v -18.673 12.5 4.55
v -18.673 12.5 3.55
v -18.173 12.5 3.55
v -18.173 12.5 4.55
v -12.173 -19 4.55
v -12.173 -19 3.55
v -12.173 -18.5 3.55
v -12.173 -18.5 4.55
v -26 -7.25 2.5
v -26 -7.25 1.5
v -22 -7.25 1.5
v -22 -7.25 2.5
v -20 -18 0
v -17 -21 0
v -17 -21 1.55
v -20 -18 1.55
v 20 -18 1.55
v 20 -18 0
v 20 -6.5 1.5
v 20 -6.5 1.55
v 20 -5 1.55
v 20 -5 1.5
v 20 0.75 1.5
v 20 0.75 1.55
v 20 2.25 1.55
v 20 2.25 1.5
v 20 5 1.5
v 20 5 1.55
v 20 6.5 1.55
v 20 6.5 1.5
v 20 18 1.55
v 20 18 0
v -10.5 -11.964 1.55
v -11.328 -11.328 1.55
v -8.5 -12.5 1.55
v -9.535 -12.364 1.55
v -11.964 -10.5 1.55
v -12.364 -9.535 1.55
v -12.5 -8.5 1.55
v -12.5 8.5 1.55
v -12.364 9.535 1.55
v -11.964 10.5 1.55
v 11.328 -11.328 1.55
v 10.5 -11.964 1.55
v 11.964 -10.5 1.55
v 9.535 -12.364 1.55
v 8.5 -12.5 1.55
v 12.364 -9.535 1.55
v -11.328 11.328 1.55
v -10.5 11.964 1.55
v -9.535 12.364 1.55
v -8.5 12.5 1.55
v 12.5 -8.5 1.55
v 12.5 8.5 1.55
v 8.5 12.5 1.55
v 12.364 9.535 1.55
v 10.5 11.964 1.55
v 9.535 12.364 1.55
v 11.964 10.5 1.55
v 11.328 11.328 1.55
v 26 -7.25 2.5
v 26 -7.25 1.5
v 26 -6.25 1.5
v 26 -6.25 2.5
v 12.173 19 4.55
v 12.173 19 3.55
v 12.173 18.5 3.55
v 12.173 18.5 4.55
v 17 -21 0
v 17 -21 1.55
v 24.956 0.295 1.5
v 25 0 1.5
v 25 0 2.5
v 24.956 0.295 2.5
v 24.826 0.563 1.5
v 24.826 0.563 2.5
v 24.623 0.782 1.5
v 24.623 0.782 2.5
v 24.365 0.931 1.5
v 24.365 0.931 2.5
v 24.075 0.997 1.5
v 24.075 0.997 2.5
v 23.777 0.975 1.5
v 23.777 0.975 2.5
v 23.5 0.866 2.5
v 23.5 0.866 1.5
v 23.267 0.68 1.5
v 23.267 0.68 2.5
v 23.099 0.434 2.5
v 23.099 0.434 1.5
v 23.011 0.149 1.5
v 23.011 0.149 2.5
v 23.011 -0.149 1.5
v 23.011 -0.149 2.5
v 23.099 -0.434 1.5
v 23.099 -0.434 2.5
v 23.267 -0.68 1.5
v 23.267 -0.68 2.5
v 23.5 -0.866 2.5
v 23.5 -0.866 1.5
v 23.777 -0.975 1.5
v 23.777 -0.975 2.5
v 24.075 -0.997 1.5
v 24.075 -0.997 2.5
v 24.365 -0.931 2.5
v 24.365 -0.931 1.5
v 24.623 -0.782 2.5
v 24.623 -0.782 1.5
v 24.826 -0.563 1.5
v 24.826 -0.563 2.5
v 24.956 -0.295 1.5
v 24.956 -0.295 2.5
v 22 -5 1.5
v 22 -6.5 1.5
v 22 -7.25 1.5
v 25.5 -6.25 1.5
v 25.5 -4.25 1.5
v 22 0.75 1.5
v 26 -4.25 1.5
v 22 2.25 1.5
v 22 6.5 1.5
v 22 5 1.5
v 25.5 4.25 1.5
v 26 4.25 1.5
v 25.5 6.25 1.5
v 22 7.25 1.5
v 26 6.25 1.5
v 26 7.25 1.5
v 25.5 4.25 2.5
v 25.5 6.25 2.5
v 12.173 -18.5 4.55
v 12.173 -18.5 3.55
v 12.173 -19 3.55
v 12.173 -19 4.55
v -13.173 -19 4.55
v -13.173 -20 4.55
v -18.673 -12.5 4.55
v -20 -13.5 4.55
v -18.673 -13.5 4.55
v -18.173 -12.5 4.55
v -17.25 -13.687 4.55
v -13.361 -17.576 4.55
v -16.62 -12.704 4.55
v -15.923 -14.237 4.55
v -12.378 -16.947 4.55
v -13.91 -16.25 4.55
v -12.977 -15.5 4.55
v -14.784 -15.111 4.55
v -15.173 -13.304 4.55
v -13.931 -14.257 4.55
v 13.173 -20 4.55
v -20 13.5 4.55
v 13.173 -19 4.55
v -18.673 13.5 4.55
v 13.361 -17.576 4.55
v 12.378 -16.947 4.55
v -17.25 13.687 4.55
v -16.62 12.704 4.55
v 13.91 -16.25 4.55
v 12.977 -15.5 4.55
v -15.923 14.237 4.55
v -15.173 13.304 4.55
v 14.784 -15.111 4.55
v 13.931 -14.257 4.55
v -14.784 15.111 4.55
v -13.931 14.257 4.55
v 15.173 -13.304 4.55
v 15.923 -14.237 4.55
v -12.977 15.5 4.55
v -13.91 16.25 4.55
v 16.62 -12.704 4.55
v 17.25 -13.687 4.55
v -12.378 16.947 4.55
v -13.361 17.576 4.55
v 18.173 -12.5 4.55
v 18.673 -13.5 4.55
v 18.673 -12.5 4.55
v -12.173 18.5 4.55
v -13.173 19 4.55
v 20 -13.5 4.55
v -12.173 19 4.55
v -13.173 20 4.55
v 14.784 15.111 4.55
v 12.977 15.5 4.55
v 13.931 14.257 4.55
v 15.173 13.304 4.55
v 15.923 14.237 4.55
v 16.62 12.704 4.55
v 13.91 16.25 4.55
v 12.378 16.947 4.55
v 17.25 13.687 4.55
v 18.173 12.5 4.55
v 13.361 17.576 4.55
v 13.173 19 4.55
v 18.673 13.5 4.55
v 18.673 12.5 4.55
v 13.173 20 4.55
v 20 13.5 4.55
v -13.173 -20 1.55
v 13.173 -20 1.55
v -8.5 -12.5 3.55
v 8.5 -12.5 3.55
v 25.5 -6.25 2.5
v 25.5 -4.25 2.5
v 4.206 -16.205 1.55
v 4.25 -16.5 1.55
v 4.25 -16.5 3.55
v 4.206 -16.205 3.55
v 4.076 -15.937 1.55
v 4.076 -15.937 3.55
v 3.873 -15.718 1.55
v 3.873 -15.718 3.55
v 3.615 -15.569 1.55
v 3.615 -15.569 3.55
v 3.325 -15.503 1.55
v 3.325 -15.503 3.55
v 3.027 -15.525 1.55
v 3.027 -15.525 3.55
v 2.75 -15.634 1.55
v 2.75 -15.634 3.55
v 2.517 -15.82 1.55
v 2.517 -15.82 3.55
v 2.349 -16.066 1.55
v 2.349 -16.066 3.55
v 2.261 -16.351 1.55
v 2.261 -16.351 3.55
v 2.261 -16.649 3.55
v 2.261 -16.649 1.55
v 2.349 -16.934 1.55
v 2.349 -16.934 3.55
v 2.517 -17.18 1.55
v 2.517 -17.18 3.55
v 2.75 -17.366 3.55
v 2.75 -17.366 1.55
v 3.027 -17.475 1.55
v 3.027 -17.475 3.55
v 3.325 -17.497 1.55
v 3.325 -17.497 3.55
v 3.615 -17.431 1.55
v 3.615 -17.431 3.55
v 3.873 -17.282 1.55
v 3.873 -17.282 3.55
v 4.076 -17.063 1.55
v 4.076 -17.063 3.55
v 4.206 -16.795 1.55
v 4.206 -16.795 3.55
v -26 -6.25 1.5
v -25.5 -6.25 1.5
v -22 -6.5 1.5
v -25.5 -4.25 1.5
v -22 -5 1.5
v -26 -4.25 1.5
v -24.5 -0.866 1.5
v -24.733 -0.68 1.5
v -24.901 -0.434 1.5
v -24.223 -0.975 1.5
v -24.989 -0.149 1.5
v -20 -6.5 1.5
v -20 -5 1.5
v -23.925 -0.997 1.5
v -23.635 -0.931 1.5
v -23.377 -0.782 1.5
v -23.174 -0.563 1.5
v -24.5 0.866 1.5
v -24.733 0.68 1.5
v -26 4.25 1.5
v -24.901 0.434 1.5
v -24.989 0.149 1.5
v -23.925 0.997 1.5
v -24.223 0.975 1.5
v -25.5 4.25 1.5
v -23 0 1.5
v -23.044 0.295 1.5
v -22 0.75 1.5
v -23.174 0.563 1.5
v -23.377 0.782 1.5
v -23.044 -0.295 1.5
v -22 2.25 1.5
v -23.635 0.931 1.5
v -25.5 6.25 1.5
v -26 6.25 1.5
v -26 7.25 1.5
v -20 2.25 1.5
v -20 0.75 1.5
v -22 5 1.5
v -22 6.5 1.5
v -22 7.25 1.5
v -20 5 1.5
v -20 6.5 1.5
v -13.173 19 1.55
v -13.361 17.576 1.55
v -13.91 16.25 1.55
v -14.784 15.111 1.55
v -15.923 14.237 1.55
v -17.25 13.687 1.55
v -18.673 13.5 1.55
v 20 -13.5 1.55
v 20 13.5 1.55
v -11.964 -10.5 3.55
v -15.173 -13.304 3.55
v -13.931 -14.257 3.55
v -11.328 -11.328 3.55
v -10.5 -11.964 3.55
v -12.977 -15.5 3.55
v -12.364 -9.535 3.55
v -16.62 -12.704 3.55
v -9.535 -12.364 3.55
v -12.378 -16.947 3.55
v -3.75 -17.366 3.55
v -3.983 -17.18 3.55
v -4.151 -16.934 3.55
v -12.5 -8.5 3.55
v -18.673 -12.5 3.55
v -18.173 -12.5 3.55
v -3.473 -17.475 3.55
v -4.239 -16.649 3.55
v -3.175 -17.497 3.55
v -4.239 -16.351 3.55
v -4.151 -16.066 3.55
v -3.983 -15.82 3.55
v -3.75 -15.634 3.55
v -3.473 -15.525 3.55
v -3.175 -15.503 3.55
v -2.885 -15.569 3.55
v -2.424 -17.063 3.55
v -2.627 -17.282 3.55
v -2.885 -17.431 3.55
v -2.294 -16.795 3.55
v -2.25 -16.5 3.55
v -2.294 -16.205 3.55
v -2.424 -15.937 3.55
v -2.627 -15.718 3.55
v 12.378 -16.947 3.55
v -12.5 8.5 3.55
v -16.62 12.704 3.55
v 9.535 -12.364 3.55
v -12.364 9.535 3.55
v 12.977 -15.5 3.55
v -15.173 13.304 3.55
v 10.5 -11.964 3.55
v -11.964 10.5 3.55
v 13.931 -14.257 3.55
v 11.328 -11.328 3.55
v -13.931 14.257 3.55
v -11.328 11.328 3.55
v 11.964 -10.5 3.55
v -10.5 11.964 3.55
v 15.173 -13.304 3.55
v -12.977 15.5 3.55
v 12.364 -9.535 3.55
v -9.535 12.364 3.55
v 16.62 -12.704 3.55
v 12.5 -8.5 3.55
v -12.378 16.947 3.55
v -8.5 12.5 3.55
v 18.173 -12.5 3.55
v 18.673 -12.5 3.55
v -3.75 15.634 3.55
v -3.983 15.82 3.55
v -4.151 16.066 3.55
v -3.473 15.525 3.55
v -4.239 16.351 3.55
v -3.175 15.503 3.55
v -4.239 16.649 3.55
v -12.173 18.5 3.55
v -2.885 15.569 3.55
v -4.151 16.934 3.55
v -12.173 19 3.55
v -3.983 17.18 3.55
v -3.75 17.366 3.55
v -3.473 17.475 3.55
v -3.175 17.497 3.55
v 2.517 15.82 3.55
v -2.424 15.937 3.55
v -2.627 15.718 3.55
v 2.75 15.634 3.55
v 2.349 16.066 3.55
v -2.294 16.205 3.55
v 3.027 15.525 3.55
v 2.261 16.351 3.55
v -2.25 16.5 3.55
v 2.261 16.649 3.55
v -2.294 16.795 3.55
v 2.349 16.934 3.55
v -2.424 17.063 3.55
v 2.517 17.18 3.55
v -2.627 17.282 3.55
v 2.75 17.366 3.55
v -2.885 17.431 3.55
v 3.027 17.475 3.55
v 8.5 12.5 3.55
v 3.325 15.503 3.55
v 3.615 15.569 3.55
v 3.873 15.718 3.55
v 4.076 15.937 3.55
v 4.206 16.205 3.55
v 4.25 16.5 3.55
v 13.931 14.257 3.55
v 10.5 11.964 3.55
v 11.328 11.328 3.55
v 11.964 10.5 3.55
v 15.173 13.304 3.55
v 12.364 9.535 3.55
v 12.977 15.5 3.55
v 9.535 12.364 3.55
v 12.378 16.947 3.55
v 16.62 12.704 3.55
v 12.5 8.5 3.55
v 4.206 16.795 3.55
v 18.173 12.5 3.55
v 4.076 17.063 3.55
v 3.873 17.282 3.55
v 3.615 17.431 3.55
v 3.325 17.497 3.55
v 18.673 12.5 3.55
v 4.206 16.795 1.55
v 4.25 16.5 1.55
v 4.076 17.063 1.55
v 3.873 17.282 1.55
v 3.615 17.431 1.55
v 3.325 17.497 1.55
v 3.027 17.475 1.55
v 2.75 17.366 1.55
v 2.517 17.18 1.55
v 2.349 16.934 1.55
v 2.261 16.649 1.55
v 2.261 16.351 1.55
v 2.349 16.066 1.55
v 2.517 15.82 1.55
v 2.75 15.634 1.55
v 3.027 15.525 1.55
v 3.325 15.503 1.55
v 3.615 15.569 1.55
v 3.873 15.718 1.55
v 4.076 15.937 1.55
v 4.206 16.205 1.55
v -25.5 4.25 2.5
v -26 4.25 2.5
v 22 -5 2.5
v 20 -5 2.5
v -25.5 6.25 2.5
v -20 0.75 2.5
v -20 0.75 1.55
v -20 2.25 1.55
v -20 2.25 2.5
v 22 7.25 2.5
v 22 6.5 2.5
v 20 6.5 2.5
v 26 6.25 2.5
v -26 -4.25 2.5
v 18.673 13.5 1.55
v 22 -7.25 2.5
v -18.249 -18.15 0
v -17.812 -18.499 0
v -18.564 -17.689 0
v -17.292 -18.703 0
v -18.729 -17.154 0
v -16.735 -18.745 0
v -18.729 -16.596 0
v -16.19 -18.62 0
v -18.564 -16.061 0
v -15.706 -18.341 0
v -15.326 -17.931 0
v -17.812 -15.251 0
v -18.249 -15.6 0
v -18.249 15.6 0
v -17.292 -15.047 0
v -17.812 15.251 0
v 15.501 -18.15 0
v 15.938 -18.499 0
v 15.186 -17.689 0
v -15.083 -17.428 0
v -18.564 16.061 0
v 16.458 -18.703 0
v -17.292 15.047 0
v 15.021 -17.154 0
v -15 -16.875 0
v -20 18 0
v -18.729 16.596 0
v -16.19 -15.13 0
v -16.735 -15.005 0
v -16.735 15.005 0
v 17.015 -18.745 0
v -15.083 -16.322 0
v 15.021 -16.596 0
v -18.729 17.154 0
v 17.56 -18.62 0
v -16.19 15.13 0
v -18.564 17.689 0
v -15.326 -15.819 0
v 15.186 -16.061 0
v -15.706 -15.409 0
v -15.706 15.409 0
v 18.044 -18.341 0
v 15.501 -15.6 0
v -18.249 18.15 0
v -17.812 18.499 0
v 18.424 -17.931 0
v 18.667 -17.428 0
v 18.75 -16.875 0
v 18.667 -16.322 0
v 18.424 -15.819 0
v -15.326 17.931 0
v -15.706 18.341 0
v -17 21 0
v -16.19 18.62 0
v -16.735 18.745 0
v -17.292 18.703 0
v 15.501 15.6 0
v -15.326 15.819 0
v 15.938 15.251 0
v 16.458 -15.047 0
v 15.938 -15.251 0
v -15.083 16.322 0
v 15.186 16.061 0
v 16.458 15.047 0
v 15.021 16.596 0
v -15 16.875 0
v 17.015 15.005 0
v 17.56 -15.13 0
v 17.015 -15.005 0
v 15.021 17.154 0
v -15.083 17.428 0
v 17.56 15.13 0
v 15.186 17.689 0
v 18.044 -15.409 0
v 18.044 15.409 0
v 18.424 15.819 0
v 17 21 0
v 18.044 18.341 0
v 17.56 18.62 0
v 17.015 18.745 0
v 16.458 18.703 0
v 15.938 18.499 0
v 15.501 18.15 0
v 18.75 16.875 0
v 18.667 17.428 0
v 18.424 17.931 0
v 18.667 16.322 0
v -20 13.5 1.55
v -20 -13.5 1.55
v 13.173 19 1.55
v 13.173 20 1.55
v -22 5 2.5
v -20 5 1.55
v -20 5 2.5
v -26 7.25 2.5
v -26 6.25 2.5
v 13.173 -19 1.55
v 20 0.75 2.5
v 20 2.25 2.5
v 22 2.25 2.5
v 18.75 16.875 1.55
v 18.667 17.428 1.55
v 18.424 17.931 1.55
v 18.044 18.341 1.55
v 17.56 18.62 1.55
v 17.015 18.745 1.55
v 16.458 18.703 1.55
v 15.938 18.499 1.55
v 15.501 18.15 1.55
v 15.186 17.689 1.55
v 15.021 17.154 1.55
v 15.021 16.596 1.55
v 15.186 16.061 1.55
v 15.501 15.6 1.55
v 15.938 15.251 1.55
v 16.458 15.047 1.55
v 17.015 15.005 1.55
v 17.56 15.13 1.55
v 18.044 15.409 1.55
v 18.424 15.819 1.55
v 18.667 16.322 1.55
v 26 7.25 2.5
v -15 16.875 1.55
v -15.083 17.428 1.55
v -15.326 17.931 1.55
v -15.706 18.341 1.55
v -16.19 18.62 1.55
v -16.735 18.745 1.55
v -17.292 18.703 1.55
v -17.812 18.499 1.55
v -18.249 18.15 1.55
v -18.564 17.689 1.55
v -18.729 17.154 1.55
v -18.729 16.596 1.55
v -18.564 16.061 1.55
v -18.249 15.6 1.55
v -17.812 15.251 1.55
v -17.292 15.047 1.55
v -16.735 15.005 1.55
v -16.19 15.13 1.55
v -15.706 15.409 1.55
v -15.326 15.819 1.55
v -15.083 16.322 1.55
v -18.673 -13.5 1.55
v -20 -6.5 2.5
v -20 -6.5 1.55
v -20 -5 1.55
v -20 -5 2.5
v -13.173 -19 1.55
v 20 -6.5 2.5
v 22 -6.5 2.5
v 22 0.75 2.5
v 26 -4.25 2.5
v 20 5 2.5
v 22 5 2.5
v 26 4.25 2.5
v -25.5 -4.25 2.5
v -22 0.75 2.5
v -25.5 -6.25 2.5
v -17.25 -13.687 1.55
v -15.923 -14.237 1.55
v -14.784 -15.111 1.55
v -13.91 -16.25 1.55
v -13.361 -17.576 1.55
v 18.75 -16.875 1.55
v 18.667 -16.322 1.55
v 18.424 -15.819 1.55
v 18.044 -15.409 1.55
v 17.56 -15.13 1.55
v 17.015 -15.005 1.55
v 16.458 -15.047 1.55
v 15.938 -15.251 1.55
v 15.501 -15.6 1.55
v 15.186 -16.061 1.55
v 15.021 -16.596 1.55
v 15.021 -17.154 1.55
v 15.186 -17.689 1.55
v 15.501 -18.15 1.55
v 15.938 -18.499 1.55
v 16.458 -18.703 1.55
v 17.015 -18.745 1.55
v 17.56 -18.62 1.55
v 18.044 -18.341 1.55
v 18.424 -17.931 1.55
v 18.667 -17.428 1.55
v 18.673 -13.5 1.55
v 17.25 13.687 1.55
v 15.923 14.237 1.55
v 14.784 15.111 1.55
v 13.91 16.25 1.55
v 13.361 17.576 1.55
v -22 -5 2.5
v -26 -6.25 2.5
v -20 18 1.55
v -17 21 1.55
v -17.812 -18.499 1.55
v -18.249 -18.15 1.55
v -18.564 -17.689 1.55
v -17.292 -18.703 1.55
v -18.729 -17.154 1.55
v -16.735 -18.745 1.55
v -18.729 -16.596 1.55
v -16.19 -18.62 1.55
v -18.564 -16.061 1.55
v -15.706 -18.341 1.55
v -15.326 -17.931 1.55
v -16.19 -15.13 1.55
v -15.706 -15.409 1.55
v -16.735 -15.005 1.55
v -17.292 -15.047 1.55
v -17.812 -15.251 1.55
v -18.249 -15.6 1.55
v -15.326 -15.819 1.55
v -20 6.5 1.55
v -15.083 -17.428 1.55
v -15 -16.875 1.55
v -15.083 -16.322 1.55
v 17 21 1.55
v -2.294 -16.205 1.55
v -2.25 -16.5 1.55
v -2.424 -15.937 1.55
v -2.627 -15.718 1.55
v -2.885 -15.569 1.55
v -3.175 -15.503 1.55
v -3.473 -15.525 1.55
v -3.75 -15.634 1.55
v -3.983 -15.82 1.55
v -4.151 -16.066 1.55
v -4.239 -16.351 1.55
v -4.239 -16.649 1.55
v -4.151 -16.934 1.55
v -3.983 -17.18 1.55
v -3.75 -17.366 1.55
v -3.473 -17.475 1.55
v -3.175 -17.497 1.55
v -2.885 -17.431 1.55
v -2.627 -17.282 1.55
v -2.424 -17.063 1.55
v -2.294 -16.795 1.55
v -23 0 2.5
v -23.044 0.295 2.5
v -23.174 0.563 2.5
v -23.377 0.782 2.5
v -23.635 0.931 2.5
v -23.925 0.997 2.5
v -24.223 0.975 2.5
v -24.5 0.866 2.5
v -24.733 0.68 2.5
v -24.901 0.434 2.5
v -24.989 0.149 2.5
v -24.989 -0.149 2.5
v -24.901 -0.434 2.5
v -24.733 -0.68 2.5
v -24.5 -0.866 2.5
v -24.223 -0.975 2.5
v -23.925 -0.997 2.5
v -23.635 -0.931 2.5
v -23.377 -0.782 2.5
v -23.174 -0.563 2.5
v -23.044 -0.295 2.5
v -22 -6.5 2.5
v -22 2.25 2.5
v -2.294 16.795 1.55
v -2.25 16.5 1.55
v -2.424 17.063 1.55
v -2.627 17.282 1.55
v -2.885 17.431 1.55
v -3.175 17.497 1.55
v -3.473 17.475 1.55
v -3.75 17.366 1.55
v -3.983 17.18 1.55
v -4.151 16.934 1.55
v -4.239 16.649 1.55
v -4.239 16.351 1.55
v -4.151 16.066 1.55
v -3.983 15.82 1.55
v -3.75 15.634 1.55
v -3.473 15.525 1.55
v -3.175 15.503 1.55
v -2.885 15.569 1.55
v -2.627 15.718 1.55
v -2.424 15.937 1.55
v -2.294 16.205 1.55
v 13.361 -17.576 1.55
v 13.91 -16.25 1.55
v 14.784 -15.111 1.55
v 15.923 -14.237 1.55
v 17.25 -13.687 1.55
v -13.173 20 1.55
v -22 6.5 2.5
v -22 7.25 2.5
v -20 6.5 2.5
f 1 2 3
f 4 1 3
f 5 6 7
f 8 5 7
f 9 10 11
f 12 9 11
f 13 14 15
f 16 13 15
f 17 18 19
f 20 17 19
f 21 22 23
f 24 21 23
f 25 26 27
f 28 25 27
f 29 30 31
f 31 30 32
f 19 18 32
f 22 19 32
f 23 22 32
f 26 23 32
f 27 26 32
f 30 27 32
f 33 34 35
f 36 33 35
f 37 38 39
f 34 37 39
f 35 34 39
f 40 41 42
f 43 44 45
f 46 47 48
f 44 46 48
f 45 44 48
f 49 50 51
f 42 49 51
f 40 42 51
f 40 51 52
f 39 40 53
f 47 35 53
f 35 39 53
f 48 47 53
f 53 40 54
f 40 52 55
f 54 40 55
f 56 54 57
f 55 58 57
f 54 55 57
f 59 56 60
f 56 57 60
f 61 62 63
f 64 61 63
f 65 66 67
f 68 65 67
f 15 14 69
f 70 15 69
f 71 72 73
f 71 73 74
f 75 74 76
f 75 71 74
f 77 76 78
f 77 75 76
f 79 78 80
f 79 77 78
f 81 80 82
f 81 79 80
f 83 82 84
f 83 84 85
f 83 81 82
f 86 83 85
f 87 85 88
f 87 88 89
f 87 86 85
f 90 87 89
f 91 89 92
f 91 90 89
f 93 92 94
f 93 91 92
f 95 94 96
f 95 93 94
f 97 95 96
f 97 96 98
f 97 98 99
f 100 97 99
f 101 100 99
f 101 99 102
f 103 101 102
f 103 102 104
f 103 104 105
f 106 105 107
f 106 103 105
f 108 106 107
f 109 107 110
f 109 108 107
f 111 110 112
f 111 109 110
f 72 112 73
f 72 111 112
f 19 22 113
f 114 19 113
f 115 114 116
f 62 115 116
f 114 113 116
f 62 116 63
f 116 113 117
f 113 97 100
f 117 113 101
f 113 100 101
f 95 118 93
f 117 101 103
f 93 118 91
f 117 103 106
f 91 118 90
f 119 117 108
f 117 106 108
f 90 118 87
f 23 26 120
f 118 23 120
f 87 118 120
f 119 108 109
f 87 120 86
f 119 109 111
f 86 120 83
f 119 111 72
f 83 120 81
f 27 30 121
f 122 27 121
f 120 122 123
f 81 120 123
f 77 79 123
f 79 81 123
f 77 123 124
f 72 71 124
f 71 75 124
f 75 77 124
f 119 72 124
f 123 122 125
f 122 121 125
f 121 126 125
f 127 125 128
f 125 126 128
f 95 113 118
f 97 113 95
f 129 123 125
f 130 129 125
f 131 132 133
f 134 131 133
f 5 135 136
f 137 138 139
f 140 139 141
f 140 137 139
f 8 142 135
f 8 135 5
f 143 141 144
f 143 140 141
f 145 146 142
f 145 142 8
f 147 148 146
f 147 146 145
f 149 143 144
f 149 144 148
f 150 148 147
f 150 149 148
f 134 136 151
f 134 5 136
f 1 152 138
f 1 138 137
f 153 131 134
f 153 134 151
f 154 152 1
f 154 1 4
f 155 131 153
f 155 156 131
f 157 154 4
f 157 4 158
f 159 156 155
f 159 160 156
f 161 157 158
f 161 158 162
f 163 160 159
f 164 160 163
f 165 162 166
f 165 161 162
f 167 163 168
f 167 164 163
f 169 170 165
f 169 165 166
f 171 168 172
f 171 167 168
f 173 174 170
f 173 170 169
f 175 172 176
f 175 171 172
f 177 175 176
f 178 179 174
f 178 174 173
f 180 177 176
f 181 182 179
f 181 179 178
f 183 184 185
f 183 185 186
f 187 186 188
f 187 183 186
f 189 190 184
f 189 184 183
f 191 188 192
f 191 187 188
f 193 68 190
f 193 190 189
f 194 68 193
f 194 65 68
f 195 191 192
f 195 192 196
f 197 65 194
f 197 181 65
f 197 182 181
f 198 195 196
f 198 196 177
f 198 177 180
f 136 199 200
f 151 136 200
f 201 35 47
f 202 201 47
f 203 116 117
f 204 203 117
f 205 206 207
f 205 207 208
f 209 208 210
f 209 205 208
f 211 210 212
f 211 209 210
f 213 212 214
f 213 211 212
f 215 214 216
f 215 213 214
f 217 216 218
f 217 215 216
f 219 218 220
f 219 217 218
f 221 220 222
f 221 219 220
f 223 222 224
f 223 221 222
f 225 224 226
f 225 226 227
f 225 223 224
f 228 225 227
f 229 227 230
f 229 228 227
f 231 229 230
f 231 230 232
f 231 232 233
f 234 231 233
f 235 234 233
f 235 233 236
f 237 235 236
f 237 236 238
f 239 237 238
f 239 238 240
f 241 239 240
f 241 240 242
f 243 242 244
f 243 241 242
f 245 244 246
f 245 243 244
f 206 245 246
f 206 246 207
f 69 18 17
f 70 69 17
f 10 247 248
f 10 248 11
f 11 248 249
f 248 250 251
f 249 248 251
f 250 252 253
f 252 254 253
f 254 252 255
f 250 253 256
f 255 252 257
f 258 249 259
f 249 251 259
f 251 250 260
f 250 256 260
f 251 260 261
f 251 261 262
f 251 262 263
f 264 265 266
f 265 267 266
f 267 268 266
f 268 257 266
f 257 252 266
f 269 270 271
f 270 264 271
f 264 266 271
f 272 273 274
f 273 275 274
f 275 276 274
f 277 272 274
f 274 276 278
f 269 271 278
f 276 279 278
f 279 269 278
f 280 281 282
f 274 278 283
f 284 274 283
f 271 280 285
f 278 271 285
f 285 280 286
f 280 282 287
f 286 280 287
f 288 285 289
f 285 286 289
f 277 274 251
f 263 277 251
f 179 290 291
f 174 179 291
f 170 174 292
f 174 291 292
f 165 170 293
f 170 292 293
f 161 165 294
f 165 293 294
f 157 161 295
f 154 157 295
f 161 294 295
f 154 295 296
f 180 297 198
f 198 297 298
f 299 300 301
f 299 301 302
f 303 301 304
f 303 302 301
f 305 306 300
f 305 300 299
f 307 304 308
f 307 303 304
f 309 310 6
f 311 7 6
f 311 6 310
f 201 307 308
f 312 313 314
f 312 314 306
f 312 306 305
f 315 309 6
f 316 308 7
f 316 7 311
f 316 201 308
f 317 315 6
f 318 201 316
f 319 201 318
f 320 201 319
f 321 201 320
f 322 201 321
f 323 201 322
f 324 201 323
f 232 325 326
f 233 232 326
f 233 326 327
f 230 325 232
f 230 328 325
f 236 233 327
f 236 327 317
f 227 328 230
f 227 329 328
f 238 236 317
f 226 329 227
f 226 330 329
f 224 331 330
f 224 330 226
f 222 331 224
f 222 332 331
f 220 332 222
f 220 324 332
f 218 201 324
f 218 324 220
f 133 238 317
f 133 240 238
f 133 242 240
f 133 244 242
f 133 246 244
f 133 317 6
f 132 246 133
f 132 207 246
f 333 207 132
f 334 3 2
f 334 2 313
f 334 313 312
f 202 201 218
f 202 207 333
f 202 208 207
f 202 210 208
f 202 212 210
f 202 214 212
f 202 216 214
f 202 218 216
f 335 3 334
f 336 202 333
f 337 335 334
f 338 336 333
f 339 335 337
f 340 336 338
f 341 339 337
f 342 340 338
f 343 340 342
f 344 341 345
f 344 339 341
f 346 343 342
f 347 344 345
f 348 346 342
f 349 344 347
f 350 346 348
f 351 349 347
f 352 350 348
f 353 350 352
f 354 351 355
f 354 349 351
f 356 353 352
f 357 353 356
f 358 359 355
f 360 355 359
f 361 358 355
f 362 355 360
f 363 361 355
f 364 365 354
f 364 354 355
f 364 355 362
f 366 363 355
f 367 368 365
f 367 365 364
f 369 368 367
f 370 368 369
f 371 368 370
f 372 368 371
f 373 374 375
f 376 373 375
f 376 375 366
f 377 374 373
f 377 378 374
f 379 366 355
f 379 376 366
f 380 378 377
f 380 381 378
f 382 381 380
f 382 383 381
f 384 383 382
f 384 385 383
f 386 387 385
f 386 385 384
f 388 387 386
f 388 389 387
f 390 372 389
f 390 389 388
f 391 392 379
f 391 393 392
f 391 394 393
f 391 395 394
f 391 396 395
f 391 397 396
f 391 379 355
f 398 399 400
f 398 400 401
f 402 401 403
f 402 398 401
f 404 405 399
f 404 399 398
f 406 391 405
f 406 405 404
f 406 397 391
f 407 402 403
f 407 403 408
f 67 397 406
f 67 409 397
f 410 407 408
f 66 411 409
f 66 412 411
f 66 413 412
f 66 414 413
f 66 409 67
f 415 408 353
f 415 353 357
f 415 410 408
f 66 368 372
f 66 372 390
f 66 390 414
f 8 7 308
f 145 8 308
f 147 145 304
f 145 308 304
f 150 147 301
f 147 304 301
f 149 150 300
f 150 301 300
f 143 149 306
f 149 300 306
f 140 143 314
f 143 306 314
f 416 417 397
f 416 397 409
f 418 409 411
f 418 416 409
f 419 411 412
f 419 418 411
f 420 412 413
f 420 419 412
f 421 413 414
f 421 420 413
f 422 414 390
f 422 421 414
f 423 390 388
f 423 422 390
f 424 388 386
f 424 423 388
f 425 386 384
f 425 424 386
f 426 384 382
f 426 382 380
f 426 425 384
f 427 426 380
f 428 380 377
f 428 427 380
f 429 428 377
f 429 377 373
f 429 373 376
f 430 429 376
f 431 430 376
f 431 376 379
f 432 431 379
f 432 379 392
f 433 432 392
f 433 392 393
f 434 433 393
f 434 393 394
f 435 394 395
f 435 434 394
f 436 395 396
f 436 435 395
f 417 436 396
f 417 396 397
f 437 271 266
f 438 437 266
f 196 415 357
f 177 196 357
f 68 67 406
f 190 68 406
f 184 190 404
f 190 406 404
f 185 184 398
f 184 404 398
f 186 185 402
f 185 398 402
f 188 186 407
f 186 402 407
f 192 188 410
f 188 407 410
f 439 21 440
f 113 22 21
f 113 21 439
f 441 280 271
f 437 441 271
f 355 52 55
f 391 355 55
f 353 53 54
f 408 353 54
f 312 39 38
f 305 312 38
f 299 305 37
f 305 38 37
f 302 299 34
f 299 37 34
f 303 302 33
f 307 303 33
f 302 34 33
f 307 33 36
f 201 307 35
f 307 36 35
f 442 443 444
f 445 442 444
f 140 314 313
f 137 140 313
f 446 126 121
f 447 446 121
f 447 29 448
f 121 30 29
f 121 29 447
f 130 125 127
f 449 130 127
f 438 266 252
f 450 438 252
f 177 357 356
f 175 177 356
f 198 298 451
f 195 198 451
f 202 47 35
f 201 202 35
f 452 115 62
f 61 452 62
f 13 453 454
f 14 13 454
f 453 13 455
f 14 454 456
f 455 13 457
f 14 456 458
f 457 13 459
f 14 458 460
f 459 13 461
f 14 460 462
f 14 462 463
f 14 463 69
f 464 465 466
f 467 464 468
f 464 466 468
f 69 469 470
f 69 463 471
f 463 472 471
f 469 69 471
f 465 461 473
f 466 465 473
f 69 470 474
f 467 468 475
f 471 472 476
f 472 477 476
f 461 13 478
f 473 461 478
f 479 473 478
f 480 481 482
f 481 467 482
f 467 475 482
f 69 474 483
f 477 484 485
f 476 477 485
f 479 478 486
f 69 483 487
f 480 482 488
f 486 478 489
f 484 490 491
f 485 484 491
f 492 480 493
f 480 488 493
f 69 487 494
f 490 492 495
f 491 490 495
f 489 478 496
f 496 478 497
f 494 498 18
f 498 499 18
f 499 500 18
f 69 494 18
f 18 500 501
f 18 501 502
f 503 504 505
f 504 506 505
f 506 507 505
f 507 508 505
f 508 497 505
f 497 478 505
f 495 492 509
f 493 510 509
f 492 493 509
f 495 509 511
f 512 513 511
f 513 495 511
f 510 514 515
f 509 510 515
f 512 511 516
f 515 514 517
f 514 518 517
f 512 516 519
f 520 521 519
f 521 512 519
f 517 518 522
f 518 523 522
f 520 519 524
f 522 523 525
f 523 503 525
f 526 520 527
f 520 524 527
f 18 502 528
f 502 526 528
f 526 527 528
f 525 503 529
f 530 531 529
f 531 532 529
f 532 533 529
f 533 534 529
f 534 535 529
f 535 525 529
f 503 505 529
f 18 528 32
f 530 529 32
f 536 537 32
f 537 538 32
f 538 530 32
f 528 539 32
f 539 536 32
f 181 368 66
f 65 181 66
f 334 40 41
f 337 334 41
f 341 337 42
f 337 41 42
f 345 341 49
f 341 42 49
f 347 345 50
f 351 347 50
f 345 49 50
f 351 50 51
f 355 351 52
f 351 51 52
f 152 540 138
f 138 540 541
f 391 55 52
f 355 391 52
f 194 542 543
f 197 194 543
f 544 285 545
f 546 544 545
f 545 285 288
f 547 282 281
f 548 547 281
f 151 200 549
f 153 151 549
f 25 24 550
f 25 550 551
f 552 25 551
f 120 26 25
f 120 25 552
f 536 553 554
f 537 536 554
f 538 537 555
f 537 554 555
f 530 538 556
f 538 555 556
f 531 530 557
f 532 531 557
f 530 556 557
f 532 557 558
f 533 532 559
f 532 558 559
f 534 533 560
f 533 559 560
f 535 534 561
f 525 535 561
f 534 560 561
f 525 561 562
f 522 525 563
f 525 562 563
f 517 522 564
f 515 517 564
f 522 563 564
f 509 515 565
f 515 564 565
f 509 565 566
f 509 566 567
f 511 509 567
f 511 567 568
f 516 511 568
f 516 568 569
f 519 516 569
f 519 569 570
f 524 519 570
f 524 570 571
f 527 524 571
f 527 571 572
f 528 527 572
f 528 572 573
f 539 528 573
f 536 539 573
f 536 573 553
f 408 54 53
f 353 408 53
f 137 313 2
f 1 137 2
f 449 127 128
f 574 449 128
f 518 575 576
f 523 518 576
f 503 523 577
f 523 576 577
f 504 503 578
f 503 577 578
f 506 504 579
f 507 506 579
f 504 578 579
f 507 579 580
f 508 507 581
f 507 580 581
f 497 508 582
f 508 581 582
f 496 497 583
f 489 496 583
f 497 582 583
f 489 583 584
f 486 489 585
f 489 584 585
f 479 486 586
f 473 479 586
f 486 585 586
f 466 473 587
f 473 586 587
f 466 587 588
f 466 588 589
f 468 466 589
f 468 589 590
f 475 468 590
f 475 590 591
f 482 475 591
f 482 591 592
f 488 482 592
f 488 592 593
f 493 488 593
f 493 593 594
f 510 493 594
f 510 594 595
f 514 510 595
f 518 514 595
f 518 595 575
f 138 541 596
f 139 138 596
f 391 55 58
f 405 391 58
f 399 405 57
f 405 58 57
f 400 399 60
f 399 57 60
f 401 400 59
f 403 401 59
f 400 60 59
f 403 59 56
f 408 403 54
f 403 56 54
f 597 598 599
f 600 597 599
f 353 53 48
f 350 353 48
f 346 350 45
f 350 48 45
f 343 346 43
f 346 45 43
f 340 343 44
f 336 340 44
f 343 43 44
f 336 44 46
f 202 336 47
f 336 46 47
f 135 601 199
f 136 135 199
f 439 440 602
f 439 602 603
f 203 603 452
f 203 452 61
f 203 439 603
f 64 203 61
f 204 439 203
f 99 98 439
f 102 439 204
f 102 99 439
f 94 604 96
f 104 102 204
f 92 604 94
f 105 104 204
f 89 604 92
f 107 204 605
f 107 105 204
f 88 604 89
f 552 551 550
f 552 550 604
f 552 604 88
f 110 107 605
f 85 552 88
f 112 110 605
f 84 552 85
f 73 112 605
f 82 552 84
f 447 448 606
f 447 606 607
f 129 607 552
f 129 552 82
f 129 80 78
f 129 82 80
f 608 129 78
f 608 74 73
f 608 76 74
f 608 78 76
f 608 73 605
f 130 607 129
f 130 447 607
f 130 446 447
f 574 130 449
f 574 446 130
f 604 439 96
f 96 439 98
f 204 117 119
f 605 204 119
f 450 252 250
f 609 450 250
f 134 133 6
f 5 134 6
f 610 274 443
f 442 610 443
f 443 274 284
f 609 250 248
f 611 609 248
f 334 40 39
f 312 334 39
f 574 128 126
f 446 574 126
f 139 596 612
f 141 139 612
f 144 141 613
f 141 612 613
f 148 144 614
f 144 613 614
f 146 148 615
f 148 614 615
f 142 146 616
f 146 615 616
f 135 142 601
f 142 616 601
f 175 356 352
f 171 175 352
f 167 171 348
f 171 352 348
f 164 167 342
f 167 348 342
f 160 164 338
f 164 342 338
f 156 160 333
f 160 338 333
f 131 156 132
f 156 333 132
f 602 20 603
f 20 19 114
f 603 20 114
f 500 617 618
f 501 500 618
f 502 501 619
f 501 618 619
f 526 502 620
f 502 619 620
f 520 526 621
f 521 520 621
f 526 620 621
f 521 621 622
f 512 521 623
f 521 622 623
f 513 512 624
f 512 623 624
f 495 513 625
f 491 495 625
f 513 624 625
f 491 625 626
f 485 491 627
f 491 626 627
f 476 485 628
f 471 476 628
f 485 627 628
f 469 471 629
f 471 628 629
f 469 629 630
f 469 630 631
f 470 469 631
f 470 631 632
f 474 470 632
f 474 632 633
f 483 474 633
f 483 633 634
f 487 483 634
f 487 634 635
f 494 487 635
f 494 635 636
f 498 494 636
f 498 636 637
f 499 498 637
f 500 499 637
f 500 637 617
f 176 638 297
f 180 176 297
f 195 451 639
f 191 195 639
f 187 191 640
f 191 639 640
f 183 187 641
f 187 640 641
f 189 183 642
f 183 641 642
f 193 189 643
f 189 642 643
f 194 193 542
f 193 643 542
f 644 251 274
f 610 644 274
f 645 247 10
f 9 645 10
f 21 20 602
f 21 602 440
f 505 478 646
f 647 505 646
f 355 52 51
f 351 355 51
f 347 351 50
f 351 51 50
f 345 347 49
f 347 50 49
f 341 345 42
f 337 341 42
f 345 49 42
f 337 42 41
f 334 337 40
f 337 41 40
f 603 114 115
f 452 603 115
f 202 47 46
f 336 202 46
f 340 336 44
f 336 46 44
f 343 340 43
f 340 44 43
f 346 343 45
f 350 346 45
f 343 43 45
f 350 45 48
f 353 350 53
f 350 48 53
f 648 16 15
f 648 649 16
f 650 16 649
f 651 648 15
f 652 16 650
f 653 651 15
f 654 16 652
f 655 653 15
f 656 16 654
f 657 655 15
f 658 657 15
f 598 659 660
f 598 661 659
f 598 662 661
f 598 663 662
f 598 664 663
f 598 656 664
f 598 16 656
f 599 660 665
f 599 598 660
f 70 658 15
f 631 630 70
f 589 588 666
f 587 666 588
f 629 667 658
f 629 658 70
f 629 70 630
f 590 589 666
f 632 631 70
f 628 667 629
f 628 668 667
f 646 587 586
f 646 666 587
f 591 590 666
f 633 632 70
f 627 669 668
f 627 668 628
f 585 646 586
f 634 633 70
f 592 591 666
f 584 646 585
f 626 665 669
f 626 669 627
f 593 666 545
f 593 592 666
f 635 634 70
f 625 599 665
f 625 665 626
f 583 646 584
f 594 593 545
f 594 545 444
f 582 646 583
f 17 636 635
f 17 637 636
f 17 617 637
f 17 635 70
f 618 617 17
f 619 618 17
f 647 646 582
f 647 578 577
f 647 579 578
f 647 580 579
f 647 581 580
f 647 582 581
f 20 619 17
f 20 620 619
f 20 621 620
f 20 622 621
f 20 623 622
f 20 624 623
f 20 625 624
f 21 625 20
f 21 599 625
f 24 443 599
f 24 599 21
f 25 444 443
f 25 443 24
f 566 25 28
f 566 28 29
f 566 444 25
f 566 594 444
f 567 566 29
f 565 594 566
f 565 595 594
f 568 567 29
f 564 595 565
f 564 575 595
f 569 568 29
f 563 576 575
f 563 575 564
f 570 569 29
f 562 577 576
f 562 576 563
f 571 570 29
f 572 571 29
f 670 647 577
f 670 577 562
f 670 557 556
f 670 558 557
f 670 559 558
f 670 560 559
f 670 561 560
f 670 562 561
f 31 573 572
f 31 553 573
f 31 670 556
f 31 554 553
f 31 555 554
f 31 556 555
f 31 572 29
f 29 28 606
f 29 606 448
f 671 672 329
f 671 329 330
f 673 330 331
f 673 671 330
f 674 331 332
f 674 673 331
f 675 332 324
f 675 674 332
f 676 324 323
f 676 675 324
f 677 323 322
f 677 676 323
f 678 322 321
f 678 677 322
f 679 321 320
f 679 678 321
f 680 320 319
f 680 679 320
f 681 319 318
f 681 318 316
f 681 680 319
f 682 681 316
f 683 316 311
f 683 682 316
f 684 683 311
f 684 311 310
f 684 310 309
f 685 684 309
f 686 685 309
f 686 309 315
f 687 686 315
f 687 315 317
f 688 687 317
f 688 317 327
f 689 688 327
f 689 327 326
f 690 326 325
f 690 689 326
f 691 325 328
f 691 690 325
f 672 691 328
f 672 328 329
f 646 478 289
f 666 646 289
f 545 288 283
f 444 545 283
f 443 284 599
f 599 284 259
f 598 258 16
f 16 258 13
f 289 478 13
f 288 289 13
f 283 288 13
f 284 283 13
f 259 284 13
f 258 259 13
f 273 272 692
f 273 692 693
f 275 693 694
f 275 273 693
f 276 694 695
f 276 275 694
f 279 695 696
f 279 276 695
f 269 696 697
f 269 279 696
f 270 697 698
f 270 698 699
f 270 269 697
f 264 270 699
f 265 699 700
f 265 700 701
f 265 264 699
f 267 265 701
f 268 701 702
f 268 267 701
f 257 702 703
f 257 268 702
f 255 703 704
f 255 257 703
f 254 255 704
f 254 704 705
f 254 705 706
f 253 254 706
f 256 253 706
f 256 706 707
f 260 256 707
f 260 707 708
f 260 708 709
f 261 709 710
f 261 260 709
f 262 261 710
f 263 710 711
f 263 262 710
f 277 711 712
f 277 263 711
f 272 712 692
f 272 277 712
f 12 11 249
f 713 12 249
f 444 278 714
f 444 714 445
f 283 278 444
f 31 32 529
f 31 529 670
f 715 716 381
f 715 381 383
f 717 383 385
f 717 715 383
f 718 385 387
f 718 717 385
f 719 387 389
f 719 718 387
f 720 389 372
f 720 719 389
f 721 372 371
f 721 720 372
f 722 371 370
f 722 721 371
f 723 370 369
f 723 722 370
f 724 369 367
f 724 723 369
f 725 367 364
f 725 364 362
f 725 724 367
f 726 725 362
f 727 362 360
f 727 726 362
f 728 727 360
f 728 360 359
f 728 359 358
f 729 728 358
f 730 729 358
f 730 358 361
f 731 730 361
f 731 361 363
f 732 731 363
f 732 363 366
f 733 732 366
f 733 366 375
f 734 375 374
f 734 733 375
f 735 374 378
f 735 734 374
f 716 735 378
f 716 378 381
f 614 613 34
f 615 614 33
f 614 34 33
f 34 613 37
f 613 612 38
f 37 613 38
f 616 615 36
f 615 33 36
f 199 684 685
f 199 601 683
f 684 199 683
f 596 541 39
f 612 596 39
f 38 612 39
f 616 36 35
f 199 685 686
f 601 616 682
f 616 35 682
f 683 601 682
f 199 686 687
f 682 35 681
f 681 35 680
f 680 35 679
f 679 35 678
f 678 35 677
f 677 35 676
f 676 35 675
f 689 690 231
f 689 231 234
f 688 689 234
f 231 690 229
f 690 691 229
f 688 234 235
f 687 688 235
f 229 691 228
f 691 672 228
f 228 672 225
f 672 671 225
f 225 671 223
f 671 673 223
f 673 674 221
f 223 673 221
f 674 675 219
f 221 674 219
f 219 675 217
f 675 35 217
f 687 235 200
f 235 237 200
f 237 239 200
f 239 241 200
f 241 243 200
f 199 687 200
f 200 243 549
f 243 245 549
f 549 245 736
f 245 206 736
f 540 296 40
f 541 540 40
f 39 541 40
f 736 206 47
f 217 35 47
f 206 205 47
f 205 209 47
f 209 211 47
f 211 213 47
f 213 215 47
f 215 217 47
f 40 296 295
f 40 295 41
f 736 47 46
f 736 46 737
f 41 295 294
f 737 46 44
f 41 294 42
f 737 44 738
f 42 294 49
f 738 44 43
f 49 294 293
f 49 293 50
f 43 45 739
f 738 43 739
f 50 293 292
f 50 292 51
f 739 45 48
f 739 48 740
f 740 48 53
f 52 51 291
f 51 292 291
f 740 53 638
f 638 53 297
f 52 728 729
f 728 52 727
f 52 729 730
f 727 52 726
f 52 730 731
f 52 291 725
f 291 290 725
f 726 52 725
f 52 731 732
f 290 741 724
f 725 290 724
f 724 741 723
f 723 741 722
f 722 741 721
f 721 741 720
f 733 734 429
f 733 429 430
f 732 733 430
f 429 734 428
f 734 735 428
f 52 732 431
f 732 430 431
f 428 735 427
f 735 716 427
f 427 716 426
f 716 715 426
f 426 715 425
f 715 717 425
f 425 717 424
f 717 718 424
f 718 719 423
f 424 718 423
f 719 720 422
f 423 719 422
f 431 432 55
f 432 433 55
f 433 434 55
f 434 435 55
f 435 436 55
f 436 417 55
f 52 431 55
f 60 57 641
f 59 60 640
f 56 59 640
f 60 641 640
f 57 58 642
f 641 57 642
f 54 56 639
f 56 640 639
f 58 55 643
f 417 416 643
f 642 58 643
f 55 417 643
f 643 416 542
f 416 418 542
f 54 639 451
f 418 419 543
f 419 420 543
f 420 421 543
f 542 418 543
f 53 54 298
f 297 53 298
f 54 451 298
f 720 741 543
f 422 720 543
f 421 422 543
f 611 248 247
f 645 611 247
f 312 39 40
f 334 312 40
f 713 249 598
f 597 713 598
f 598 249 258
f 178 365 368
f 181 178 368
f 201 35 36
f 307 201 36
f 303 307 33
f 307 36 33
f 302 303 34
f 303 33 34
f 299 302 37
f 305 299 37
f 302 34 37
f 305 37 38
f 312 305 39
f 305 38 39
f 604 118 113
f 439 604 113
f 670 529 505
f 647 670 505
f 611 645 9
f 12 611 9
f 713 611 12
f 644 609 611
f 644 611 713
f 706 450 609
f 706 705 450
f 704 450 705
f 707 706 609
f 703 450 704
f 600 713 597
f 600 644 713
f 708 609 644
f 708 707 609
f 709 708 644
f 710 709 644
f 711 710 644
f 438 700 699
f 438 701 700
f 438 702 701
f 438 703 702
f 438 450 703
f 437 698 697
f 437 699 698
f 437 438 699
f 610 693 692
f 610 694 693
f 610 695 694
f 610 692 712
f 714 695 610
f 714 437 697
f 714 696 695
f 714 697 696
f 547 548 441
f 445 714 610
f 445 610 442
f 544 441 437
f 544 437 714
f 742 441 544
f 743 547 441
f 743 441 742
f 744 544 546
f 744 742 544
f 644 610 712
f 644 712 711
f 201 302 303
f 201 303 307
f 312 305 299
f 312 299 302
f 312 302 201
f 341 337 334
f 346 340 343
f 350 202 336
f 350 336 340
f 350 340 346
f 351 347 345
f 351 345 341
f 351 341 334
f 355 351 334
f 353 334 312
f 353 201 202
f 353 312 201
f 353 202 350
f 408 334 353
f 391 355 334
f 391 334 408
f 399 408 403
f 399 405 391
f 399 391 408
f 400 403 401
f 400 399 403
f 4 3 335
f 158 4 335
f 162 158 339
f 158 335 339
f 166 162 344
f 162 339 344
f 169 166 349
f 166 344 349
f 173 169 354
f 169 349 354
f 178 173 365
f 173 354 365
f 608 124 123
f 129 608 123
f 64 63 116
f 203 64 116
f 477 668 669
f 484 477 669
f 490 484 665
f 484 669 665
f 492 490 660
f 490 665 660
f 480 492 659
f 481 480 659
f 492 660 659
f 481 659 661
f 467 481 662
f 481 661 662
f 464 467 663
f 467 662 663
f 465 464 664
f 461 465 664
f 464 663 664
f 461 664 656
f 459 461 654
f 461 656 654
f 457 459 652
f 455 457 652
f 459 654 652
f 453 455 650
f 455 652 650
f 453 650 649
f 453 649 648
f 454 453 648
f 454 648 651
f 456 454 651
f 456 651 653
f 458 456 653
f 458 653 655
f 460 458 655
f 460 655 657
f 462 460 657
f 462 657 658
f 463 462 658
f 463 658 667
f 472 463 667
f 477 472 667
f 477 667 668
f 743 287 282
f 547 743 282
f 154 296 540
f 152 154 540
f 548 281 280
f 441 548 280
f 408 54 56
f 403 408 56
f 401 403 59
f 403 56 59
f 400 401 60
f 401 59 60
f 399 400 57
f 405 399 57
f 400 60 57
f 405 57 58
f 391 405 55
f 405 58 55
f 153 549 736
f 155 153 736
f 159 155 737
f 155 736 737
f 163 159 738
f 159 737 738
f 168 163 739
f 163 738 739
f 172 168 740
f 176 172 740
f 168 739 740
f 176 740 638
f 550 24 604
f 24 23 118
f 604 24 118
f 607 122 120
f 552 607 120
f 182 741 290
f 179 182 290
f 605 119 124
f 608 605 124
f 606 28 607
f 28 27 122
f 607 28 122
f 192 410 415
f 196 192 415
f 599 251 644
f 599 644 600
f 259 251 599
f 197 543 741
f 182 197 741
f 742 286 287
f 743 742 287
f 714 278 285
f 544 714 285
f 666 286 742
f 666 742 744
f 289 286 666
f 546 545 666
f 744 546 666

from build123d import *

# Parameters (mm, degrees)
F1_DEPTH = 1.55
F3_SIZE  = 3
F4_R     = 1.875
F5_DEPTH = 4
F6_DEPTH = 3
F2_R     = 1
F2_W     = 1.5
F2_H     = 0.5
F2_W_2   = 0.5
F2_H_2   = 1.5219762474
F2_H_3   = 1.4780237526
F7_DEPTH = 2
F8_DEPTH = 2
F9_START = 1.5
F0_W     = 2
F0_H     = 1.5
F0_R     = 1
F9_DEPTH = 1


with BuildPart() as f1:
    # F0 (on Top) → F1 (new body)
    with BuildSketch(Plane.XY):
        Polygon((20, 21), (-20, 21), (-20, 6.5), (-20, 5), (-20, 2.25), (-20, 0.75), (-20, -5), (-20, -6.5), (-20, -21), (20, -21), (20, -6.5), (20, -5), (20, 0.75), (20, 2.25), (20, 5), (20, 6.5), align=None)
    extrude(amount=F1_DEPTH)

    # F3
    f3_edges = [f1.edges().sort_by_distance(p)[0] for p in [
        (-20, 21, 0.775),
        (20, 21, 0.775),
        (20, -21, 0.775),
        (-20, -21, 0.775),
    ]]
    chamfer(f3_edges, length=F3_SIZE)

    # F4 (on face) → F5 (cut)
    with BuildSketch(Plane.XY.offset(1.55)):
        with Locations((-16.875, -16.875)):
            Circle(F4_R)
        with Locations((16.875, -16.875)):
            Circle(F4_R)
        with Locations((16.875, 16.875)):
            Circle(F4_R)
        with Locations((-16.875, 16.875)):
            Circle(F4_R)
    extrude(amount=-F5_DEPTH, mode=Mode.SUBTRACT)

    # F0 (on Top) → F9 (join)
    with BuildSketch(Plane.XY.offset(F9_START)):
        with Locations((21, 5.75)):
            Rectangle(F0_W, F0_H)
        with Locations((21, 1.5)):
            Rectangle(F0_W, F0_H)
        with Locations((-21, 5.75)):
            Rectangle(F0_W, F0_H)
        with Locations((-21, 1.5)):
            Rectangle(F0_W, F0_H)
        with Locations((-21, -5.75)):
            Rectangle(F0_W, F0_H)
        Polygon((-22, 5), (-22, 6.5), (-22, 7.25), (-26, 7.25), (-26, 6.25), (-25.5, 6.25), (-25.5, 4.25), (-26, 4.25), (-26, -4.25), (-25.5, -4.25), (-25.5, -6.25), (-26, -6.25), (-26, -7.25), (-22, -7.25), (-22, -6.5), (-22, -5), (-22, 0.75), (-22, 2.25), align=None)
        with Locations((-24, 0)):
            Circle(F0_R, mode=Mode.SUBTRACT)
        with Locations((21, -5.75)):
            Rectangle(F0_W, F0_H)
        Polygon((22, 7.25), (22, 6.5), (22, 5), (22, 2.25), (22, 0.75), (22, -5), (22, -6.5), (22, -7.25), (26, -7.25), (26, -6.25), (25.5, -6.25), (25.5, -4.25), (26, -4.25), (26, 4.25), (25.5, 4.25), (25.5, 6.25), (26, 6.25), (26, 7.25), align=None)
        with Locations((24, 0)):
            Circle(F0_R, mode=Mode.SUBTRACT)
    extrude(amount=F9_DEPTH)


with BuildPart() as f6:
    # F2 (on face) → F6 (new body)
    with BuildSketch(Plane.XY.offset(1.55)):
        with BuildLine():
            Line((13.1731458455, 20), (-13.1731458455, 20))
            Line((-13.1731458455, 20), (-13.1731458455, 19))
            ThreePointArc((-13.1731458455, 19), (-14.784058549, 15.1109127035), (-18.6731458455, 13.5))
            Line((-18.6731458455, 13.5), (-20, 13.5))
            Line((-20, 13.5), (-20, -13.5))
            Line((-20, -13.5), (-18.6731458455, -13.5))
            ThreePointArc((-18.6731458455, -13.5), (-14.784058549, -15.1109127035), (-13.1731458455, -19))
            Line((-13.1731458455, -19), (-13.1731458455, -20))
            Line((-13.1731458455, -20), (13.1731458455, -20))
            Line((13.1731458455, -20), (13.1731458455, -19))
            ThreePointArc((13.1731458455, -19), (14.784058549, -15.1109127035), (18.6731458455, -13.5))
            Line((18.6731458455, -13.5), (20, -13.5))
            Line((20, -13.5), (20, 13.5))
            Line((20, 13.5), (18.6731458455, 13.5))
            ThreePointArc((18.6731458455, 13.5), (14.784058549, 15.1109127035), (13.1731458455, 19))
            Line((13.1731458455, 19), (13.1731458455, 20))
        make_face()
        with BuildLine():
            Line((-12.1731458455, 18.5), (-12.1731458455, 19))
            Line((-12.1731458455, 19), (12.1731458455, 19))
            Line((12.1731458455, 19), (12.1731458455, 18.5))
            ThreePointArc((12.1731458455, 18.5), (13.9305051584, 14.2573593129), (18.1731458455, 12.5))
            Line((18.1731458455, 12.5), (18.6731458455, 12.5))
            Line((18.6731458455, 12.5), (18.6731458455, -12.5))
            Line((18.6731458455, -12.5), (18.1731458455, -12.5))
            ThreePointArc((18.1731458455, -12.5), (13.9305051584, -14.2573593129), (12.1731458455, -18.5))
            Line((12.1731458455, -18.5), (12.1731458455, -19))
            Line((12.1731458455, -19), (-12.1731458455, -19))
            Line((-12.1731458455, -19), (-12.1731458455, -18.5))
            ThreePointArc((-12.1731458455, -18.5), (-13.9305051584, -14.2573593129), (-18.1731458455, -12.5))
            Line((-18.1731458455, -12.5), (-18.6731458455, -12.5))
            Line((-18.6731458455, -12.5), (-18.6731458455, 12.5))
            Line((-18.6731458455, 12.5), (-18.1731458455, 12.5))
            ThreePointArc((-18.1731458455, 12.5), (-13.9305051584, 14.2573593129), (-12.1731458455, 18.5))
        make_face(mode=Mode.SUBTRACT)
    extrude(amount=F6_DEPTH)

    # F2 (on face) → F7 (join)
    with BuildSketch(Plane.XY.offset(1.55)):
        with BuildLine():
            Line((12.1731458455, 19), (-12.1731458455, 19))
            Line((-12.1731458455, 19), (-12.1731458455, 18.5))
            ThreePointArc((-12.1731458455, 18.5), (-13.9305051584, 14.2573593129), (-18.1731458455, 12.5))
            Line((-18.1731458455, 12.5), (-18.6731458455, 12.5))
            Line((-18.6731458455, 12.5), (-18.6731458455, -12.5))
            Line((-18.6731458455, -12.5), (-18.1731458455, -12.5))
            ThreePointArc((-18.1731458455, -12.5), (-13.9305051584, -14.2573593129), (-12.1731458455, -18.5))
            Line((-12.1731458455, -18.5), (-12.1731458455, -19))
            Line((-12.1731458455, -19), (12.1731458455, -19))
            Line((12.1731458455, -19), (12.1731458455, -18.5))
            ThreePointArc((12.1731458455, -18.5), (13.9305051584, -14.2573593129), (18.1731458455, -12.5))
            Line((18.1731458455, -12.5), (18.6731458455, -12.5))
            Line((18.6731458455, -12.5), (18.6731458455, 12.5))
            Line((18.6731458455, 12.5), (18.1731458455, 12.5))
            ThreePointArc((18.1731458455, 12.5), (13.9305051584, 14.2573593129), (12.1731458455, 18.5))
            Line((12.1731458455, 18.5), (12.1731458455, 19))
        make_face()
        Polygon((-9.1731458455, -16.4780237526), (-9.1731458455, -18), (-9.6731458455, -18), (-9.6731458455, -16.4780237526), (-11.1731458455, -16.4780237526), (-11.1731458455, -15.9780237526), (-9.6731458455, -15.9780237526), (-9.6731458455, -14.5), (-9.1731458455, -14.5), (-9.1731458455, -15.9780237526), (-7.6731458455, -15.9780237526), (-7.6731458455, -16.4780237526), align=None, mode=Mode.SUBTRACT)
        with Locations((-3.25, -16.5)):
            Circle(F2_R, mode=Mode.SUBTRACT)
        with Locations((3.25, -16.5)):
            Circle(F2_R, mode=Mode.SUBTRACT)
        with Locations((-3.25, 16.5)):
            Circle(F2_R, mode=Mode.SUBTRACT)
        with BuildLine():
            ThreePointArc((-12.5, 8.5), (-11.3284271247, 11.3284271247), (-8.5, 12.5))
            Line((-8.5, 12.5), (8.5, 12.5))
            ThreePointArc((8.5, 12.5), (11.3284271247, 11.3284271247), (12.5, 8.5))
            Line((12.5, 8.5), (12.5, -8.5))
            ThreePointArc((12.5, -8.5), (11.3284271247, -11.3284271247), (8.5, -12.5))
            Line((8.5, -12.5), (-8.5, -12.5))
            ThreePointArc((-8.5, -12.5), (-11.3284271247, -11.3284271247), (-12.5, -8.5))
            Line((-12.5, -8.5), (-12.5, 8.5))
        make_face(mode=Mode.SUBTRACT)
        with Locations((3.25, 16.5)):
            Circle(F2_R, mode=Mode.SUBTRACT)
        with Locations((-8.4231458455, -16.2280237526)):
            Rectangle(F2_W, F2_H)
        with Locations((-10.4231458455, -16.2280237526)):
            Rectangle(F2_W, F2_H)
        with Locations((-9.4231458455, -17.2390118763)):
            Rectangle(F2_W_2, F2_H_2)
        with Locations((-9.4231458455, -15.2390118763)):
            Rectangle(F2_W_2, F2_H_3)
        with Locations((-9.4231458455, -16.2280237526)):
            Rectangle(F2_W_2, F2_H)
    extrude(amount=F7_DEPTH)


with BuildPart() as f8:
    # F2 (on face) → F8 (new body)
    with BuildSketch(Plane.XY.offset(1.55)):
        with BuildLine():
            Line((8.5, 12.5), (-8.5, 12.5))
            ThreePointArc((-8.5, 12.5), (-11.3284271247, 11.3284271247), (-12.5, 8.5))
            Line((-12.5, 8.5), (-12.5, -8.5))
            ThreePointArc((-12.5, -8.5), (-11.3284271247, -11.3284271247), (-8.5, -12.5))
            Line((-8.5, -12.5), (8.5, -12.5))
            ThreePointArc((8.5, -12.5), (11.3284271247, -11.3284271247), (12.5, -8.5))
            Line((12.5, -8.5), (12.5, 8.5))
            ThreePointArc((12.5, 8.5), (11.3284271247, 11.3284271247), (8.5, 12.5))
        make_face()
    extrude(amount=F8_DEPTH)


solid = Compound([f1.part, f6.part, f8.part])
